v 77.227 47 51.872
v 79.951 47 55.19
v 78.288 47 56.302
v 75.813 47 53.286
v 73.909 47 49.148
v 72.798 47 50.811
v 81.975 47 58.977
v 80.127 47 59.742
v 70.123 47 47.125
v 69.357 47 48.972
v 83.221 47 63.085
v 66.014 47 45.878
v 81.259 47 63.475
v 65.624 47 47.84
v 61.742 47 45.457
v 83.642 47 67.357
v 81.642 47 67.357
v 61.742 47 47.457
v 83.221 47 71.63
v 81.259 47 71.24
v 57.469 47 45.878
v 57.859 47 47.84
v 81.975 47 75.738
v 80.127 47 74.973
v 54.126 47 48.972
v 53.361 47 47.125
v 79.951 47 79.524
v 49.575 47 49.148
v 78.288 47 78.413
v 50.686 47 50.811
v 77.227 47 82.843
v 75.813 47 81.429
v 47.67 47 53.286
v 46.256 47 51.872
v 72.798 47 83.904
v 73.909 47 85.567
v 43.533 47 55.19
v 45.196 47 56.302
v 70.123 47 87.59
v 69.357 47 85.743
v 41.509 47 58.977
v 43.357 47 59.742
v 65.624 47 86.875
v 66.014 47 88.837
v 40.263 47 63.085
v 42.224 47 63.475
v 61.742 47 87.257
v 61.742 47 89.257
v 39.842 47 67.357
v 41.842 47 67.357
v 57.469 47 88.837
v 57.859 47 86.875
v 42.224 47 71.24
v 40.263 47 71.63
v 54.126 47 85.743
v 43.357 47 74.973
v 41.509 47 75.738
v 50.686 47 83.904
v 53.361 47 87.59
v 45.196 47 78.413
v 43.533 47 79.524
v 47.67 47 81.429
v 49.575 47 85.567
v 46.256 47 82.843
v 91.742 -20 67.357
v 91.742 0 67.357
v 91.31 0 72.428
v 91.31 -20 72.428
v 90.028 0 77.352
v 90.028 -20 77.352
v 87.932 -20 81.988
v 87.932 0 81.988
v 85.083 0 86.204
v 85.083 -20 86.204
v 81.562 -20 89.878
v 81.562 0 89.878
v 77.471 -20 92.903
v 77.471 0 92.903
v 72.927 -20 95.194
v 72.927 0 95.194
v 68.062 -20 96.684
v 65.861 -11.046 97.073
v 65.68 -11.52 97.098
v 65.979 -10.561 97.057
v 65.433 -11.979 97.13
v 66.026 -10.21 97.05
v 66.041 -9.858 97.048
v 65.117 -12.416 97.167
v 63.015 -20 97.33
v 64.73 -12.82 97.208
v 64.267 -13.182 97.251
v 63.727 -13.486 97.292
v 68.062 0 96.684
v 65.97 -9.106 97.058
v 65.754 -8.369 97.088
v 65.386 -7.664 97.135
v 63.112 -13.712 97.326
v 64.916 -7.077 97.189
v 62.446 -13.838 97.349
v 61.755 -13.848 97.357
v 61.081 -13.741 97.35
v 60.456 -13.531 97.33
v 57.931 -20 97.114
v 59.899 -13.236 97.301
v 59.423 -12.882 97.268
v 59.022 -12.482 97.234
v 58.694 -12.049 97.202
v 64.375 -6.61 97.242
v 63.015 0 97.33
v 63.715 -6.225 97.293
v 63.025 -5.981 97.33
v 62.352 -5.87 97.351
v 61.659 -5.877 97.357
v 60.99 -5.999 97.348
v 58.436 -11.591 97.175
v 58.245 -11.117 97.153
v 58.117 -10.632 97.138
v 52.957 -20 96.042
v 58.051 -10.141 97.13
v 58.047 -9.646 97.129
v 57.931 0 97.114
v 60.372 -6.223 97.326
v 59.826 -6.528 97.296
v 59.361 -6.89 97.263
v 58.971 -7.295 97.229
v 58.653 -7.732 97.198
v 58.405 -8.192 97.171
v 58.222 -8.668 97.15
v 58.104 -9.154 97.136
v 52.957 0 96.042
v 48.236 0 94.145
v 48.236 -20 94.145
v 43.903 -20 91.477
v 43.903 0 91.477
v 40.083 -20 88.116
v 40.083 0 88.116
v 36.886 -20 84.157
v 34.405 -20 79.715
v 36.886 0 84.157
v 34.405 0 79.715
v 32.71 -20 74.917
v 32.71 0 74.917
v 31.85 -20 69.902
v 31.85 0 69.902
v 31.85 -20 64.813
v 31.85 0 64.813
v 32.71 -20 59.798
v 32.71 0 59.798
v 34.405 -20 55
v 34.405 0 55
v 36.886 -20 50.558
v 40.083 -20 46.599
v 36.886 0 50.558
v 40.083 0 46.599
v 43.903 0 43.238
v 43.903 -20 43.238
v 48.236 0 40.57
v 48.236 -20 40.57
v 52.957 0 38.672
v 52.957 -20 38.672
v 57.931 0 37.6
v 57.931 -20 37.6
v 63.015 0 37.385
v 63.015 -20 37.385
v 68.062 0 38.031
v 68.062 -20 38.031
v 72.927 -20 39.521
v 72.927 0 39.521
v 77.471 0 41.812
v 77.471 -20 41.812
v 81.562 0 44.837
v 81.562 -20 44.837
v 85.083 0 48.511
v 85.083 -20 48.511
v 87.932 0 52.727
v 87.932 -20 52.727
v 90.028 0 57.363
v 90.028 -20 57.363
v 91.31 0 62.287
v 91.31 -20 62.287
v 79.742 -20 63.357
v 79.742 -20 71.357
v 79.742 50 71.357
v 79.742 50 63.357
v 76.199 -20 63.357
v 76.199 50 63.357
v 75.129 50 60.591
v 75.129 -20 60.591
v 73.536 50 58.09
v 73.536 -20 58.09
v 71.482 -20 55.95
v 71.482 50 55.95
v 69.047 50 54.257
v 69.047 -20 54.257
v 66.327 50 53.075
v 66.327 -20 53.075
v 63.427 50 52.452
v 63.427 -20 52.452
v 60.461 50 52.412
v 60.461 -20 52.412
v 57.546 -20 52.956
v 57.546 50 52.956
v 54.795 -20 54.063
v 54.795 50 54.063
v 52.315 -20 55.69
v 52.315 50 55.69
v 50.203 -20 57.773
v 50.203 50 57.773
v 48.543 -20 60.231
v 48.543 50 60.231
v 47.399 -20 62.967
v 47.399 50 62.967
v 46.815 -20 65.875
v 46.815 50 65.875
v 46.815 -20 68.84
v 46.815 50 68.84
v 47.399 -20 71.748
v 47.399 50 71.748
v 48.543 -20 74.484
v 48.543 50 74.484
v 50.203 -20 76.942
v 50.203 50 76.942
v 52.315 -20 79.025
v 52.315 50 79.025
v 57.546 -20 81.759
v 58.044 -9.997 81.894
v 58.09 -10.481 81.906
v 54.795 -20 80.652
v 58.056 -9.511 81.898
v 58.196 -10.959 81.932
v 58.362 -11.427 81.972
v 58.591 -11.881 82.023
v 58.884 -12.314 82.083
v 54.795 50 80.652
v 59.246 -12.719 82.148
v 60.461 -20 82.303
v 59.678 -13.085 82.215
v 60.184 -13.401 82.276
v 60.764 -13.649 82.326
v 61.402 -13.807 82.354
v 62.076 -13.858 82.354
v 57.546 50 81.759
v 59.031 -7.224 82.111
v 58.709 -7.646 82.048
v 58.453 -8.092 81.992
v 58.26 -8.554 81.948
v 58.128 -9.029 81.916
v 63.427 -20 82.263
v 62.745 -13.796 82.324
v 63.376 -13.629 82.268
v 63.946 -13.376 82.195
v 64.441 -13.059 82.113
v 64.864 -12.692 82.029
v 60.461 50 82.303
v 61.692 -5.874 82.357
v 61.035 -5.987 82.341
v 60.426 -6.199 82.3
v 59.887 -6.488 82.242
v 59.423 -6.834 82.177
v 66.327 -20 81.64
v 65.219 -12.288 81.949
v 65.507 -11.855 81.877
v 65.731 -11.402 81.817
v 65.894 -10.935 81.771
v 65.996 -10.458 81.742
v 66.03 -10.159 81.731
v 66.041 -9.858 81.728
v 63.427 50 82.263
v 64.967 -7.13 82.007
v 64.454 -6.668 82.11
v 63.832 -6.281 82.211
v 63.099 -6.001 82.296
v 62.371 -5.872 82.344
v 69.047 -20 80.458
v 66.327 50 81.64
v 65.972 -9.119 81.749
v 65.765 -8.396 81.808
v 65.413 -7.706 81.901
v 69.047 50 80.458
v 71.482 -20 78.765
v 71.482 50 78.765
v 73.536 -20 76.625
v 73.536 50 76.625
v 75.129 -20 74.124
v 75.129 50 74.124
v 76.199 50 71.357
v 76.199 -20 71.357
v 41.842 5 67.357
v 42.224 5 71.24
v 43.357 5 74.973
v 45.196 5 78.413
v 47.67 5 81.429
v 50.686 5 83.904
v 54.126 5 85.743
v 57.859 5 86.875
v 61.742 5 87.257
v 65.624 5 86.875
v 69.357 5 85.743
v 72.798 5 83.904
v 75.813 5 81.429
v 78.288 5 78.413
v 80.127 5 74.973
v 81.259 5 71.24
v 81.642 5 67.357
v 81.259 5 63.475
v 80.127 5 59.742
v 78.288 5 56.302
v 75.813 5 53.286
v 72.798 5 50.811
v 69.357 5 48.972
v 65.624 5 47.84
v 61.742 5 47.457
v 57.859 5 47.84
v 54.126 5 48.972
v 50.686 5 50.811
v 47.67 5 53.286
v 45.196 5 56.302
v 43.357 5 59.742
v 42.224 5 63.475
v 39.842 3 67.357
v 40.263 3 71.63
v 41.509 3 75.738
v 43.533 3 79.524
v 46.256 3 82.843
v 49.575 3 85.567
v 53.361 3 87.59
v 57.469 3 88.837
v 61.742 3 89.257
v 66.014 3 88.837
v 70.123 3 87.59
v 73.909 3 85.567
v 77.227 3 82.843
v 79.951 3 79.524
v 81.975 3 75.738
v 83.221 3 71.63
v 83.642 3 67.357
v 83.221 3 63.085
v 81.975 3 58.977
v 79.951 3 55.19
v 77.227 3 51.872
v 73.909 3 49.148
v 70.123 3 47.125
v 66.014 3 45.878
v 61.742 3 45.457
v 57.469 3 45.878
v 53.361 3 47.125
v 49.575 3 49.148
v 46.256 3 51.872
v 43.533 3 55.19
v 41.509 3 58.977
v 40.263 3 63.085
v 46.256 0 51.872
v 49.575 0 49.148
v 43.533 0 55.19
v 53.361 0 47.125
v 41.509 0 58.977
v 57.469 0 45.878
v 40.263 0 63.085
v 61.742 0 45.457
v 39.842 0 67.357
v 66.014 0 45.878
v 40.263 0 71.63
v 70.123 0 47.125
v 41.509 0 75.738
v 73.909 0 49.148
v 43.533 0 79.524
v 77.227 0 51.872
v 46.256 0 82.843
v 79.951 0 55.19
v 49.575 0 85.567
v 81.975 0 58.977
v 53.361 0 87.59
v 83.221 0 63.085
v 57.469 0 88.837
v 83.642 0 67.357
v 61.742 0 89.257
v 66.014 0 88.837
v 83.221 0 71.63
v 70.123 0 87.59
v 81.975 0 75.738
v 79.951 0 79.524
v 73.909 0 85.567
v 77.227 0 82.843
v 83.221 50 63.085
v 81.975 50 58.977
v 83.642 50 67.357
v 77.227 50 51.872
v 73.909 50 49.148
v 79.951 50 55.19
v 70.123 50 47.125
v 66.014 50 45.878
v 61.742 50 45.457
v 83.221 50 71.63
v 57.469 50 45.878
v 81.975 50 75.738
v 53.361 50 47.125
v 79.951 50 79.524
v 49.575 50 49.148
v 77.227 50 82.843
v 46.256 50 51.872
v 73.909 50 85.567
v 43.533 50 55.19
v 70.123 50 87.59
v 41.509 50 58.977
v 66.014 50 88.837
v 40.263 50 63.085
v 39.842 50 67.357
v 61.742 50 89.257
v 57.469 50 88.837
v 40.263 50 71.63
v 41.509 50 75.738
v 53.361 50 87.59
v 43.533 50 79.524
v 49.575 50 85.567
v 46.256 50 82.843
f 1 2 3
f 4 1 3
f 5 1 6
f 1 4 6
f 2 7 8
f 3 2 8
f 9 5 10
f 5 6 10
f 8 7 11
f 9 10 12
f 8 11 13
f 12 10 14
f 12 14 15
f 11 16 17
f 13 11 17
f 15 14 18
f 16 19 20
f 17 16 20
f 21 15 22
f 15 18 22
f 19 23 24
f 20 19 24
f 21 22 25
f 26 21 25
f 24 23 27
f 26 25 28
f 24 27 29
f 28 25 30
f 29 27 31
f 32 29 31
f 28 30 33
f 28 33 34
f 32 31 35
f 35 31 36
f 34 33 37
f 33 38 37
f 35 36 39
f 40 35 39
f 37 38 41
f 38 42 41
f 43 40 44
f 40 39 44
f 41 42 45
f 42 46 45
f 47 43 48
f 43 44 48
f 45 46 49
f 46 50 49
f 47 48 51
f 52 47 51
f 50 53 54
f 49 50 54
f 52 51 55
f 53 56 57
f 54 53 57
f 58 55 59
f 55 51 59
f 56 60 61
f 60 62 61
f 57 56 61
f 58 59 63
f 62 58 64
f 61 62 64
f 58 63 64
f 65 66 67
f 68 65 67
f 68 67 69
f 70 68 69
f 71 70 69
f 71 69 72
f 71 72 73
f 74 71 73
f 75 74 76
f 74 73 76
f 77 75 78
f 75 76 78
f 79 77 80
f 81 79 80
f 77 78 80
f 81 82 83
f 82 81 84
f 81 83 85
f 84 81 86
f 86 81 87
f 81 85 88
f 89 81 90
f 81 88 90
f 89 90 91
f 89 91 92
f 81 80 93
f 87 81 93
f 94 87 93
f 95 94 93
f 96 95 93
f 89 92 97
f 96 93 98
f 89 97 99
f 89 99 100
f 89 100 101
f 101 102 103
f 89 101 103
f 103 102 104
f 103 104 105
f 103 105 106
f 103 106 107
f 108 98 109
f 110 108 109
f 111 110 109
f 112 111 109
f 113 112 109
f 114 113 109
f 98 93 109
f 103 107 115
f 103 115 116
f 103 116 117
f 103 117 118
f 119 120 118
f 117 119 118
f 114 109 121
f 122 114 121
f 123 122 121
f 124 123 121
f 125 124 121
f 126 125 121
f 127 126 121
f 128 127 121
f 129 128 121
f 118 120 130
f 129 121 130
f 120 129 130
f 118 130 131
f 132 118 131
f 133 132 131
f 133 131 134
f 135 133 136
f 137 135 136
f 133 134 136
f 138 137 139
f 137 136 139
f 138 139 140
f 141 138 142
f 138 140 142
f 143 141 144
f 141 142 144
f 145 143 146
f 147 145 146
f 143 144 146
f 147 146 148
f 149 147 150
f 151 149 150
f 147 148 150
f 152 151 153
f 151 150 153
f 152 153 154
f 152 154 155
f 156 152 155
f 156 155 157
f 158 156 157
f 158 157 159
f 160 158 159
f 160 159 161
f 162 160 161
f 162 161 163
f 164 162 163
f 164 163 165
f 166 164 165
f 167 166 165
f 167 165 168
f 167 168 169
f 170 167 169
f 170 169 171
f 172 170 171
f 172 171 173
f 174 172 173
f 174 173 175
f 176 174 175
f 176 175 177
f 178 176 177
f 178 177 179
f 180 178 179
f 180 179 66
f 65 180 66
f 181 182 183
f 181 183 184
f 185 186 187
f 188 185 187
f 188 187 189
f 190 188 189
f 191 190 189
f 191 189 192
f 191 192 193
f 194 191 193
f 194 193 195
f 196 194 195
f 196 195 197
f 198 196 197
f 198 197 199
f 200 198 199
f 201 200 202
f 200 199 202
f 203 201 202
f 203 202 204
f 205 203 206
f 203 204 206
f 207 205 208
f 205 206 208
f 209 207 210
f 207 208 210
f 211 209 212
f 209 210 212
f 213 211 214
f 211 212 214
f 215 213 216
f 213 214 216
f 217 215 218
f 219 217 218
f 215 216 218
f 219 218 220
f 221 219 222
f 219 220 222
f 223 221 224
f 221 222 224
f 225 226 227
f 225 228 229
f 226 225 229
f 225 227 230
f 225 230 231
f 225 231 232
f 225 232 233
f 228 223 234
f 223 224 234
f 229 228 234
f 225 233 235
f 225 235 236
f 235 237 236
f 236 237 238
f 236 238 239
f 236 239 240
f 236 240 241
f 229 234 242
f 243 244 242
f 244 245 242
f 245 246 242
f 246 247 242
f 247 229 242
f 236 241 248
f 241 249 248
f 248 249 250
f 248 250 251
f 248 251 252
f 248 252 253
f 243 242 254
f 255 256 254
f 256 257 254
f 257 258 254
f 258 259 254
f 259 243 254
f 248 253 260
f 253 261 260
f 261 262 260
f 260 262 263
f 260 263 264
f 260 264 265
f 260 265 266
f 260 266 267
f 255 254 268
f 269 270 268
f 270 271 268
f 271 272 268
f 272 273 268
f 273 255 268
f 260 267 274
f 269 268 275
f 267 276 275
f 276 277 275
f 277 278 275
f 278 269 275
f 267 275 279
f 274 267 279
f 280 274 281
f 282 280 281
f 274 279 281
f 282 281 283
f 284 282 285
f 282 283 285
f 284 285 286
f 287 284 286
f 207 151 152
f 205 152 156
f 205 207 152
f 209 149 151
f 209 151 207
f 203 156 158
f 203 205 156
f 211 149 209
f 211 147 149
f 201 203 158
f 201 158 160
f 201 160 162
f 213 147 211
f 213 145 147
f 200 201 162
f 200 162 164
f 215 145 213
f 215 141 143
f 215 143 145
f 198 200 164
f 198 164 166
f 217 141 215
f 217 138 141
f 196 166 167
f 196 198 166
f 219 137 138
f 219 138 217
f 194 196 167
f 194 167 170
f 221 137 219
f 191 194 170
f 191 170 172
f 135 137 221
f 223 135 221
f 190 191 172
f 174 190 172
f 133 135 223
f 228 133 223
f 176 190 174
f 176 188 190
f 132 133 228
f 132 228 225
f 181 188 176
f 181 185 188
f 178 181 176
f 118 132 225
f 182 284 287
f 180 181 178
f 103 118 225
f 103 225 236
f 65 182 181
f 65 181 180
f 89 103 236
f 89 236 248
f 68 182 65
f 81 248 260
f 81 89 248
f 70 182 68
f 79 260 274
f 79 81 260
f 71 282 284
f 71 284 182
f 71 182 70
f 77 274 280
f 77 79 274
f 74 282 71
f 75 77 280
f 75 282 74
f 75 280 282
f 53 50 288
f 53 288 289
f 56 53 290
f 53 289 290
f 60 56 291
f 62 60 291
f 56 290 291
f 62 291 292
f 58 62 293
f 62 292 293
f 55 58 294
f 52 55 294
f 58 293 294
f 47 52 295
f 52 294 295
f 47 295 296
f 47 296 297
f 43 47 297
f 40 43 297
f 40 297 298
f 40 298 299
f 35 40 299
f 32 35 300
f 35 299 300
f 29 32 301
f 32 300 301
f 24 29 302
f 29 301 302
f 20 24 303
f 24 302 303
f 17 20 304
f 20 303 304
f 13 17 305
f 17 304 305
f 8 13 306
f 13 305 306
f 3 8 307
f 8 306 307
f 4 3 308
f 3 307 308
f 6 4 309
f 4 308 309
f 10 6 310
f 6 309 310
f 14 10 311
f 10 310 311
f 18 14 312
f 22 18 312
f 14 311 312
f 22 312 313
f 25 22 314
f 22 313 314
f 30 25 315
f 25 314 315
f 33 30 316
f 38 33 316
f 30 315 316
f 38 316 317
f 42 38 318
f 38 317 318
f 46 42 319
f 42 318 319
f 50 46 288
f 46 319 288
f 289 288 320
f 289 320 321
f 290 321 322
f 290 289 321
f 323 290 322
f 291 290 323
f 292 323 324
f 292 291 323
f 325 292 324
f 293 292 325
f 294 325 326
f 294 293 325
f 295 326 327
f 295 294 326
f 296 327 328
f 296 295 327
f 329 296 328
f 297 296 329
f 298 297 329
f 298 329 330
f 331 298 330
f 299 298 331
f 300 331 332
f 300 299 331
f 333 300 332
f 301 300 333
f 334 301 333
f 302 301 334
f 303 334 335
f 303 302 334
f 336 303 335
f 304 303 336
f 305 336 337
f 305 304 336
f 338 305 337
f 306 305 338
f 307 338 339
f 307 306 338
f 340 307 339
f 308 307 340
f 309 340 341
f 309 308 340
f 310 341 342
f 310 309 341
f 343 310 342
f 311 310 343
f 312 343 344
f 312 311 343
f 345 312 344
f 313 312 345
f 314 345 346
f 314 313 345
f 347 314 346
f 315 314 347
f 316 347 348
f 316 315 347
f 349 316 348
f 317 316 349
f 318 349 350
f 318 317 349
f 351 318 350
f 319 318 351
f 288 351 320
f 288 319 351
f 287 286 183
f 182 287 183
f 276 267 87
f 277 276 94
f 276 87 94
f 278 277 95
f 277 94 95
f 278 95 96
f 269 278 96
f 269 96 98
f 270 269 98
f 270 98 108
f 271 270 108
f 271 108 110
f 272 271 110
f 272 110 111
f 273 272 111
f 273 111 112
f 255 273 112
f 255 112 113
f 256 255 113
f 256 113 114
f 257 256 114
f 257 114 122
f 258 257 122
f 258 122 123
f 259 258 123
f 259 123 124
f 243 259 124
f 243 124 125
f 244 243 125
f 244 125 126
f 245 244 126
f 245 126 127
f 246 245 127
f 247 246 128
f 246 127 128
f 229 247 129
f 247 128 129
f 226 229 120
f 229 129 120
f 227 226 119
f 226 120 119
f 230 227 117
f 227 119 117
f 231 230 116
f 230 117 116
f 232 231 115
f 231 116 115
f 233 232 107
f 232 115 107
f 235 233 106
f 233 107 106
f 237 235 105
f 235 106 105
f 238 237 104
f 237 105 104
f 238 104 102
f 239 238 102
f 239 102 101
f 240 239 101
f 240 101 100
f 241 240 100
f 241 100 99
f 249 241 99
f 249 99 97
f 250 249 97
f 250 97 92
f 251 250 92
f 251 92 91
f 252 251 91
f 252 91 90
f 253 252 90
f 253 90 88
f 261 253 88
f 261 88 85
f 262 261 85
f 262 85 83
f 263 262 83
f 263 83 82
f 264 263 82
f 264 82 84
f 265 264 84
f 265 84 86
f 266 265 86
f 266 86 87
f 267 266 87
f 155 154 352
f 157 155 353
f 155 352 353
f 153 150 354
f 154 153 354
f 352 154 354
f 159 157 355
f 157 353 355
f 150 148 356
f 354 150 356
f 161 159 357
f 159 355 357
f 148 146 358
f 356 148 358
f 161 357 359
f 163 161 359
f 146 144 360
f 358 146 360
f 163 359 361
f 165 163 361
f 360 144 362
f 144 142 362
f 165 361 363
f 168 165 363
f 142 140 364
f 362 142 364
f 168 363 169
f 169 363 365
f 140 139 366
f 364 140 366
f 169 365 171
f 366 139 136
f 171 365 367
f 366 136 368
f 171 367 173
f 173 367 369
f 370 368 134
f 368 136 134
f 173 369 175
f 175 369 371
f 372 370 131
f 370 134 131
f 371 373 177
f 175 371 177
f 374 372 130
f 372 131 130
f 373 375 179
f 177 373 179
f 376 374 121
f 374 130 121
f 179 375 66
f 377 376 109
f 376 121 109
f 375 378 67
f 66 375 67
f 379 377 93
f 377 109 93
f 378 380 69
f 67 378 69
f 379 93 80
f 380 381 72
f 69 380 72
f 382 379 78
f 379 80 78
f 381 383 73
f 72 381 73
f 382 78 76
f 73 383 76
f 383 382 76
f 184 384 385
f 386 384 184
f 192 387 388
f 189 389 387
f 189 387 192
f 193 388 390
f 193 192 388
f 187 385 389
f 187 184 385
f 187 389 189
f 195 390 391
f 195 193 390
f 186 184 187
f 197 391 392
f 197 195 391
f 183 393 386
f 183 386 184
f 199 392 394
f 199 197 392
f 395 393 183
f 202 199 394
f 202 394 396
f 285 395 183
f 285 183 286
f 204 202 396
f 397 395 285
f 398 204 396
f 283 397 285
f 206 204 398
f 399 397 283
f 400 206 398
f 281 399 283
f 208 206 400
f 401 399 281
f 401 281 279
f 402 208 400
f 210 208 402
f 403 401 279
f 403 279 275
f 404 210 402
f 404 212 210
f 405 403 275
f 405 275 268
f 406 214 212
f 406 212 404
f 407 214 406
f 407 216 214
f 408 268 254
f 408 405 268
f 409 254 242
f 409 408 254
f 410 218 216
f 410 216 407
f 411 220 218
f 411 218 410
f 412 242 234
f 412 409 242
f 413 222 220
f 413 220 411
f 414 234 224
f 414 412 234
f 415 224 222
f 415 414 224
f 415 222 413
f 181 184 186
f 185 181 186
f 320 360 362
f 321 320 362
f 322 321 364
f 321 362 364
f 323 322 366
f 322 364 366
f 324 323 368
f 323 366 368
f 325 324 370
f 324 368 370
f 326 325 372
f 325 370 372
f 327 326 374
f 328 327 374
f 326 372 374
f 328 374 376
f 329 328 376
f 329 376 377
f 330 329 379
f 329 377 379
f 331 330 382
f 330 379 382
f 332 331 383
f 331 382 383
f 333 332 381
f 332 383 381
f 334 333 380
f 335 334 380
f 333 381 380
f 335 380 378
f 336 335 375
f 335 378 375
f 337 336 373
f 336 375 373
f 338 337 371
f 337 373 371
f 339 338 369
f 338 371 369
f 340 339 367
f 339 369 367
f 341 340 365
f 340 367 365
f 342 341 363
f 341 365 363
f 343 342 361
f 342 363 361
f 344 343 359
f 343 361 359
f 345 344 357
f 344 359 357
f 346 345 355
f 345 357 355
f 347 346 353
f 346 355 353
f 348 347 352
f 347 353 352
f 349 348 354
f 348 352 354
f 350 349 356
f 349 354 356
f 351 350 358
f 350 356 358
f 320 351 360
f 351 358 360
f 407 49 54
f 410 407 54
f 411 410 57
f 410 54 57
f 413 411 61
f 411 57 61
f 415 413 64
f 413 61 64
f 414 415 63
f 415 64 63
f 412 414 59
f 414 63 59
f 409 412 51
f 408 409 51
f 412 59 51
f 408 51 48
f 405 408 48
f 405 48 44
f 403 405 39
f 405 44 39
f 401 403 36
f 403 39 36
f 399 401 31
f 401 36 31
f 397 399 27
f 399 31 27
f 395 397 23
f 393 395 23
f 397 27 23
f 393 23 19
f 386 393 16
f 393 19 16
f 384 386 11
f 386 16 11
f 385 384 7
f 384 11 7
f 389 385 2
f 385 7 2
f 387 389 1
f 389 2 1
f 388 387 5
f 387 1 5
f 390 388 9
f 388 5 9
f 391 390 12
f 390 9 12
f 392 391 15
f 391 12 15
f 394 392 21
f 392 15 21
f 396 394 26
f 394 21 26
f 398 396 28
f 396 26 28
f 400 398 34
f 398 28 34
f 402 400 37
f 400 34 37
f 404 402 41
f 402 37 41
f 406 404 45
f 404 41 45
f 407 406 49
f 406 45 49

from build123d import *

# Parameters (mm, degrees)
F0_R      = 30
F1_DEPTH  = 20
F2_R      = 21.9
F3_DEPTH  = 5
F4_SIZE   = 2
F5_DEPTH  = 42
F6_R      = 21.9
F6_R_2    = 19.9
F7_DEPTH  = 3
F9_DEPTH  = 74.3
F11_R     = 4
F12_DEPTH = 25


with BuildPart() as f1:
    # F0 (on Front) → F1 (new body)
    with BuildSketch(Plane.XZ):
        with Locations((61.7417618632, 67.357480526)):
            Circle(F0_R)
    extrude(amount=F1_DEPTH)

    # F2 (on face) → F3 (join)
    with BuildSketch(Plane(origin=(0, 0, 0), x_dir=(-1, 0, 0), z_dir=(0, 1, 0))):
        with Locations((-61.7417618632, 67.357480526)):
            Circle(F2_R)
    extrude(amount=F3_DEPTH)

    # F4
    f4_edges = [f1.edges().sort_by_distance(p)[0] for p in [
        (83.641762, 5, 67.357481),
    ]]
    chamfer(f4_edges, length=F4_SIZE)

    # F5 (add): a face of the model
    f5_faces = [f1.faces().sort_by_distance(p)[0] for p in [
        (61.7417618632, 5, 67.357480526),
    ]]
    extrude(f5_faces, amount=F5_DEPTH)

    # F6 (on face) → F7 (join)
    with BuildSketch(Plane(origin=(0, 47, 0), x_dir=(-1, 0, 0), z_dir=(0, 1, 0))):
        with Locations((-61.7417618632, 67.357480526)):
            Circle(F6_R)
        with Locations((-61.7417618632, 67.357480526)):
            Circle(F6_R_2, mode=Mode.SUBTRACT)
        with Locations((-61.7417618632, 67.357480526)):
            Circle(F6_R_2)
    extrude(amount=F7_DEPTH)

    # F8 (on face) → F9 (cut)
    with BuildSketch(Plane(origin=(0, 50, 0), x_dir=(-1, 0, 0), z_dir=(0, 1, 0))):
        with BuildLine():
            Line((-79.7417618632, 63.357480526), (-76.198594158, 63.357480526))
            ThreePointArc((-76.198594158, 63.357480526), (-46.7417618632, 67.357480526), (-76.198594158, 71.357480526))
            Line((-76.198594158, 71.357480526), (-79.7417618632, 71.357480526))
            Line((-79.7417618632, 71.357480526), (-79.7417618632, 67.357480526))
            Line((-79.7417618632, 67.357480526), (-79.7417618632, 63.357480526))
        make_face()
    extrude(amount=-F9_DEPTH, mode=Mode.SUBTRACT)

    # F11 (on offset) → F12 (cut)
    with BuildSketch(Plane.XY.offset(100)):
        with Locations((62.0413188264, -9.8582830757)):
            Circle(F11_R)
    extrude(amount=-F12_DEPTH, mode=Mode.SUBTRACT)


solid = f1.part
